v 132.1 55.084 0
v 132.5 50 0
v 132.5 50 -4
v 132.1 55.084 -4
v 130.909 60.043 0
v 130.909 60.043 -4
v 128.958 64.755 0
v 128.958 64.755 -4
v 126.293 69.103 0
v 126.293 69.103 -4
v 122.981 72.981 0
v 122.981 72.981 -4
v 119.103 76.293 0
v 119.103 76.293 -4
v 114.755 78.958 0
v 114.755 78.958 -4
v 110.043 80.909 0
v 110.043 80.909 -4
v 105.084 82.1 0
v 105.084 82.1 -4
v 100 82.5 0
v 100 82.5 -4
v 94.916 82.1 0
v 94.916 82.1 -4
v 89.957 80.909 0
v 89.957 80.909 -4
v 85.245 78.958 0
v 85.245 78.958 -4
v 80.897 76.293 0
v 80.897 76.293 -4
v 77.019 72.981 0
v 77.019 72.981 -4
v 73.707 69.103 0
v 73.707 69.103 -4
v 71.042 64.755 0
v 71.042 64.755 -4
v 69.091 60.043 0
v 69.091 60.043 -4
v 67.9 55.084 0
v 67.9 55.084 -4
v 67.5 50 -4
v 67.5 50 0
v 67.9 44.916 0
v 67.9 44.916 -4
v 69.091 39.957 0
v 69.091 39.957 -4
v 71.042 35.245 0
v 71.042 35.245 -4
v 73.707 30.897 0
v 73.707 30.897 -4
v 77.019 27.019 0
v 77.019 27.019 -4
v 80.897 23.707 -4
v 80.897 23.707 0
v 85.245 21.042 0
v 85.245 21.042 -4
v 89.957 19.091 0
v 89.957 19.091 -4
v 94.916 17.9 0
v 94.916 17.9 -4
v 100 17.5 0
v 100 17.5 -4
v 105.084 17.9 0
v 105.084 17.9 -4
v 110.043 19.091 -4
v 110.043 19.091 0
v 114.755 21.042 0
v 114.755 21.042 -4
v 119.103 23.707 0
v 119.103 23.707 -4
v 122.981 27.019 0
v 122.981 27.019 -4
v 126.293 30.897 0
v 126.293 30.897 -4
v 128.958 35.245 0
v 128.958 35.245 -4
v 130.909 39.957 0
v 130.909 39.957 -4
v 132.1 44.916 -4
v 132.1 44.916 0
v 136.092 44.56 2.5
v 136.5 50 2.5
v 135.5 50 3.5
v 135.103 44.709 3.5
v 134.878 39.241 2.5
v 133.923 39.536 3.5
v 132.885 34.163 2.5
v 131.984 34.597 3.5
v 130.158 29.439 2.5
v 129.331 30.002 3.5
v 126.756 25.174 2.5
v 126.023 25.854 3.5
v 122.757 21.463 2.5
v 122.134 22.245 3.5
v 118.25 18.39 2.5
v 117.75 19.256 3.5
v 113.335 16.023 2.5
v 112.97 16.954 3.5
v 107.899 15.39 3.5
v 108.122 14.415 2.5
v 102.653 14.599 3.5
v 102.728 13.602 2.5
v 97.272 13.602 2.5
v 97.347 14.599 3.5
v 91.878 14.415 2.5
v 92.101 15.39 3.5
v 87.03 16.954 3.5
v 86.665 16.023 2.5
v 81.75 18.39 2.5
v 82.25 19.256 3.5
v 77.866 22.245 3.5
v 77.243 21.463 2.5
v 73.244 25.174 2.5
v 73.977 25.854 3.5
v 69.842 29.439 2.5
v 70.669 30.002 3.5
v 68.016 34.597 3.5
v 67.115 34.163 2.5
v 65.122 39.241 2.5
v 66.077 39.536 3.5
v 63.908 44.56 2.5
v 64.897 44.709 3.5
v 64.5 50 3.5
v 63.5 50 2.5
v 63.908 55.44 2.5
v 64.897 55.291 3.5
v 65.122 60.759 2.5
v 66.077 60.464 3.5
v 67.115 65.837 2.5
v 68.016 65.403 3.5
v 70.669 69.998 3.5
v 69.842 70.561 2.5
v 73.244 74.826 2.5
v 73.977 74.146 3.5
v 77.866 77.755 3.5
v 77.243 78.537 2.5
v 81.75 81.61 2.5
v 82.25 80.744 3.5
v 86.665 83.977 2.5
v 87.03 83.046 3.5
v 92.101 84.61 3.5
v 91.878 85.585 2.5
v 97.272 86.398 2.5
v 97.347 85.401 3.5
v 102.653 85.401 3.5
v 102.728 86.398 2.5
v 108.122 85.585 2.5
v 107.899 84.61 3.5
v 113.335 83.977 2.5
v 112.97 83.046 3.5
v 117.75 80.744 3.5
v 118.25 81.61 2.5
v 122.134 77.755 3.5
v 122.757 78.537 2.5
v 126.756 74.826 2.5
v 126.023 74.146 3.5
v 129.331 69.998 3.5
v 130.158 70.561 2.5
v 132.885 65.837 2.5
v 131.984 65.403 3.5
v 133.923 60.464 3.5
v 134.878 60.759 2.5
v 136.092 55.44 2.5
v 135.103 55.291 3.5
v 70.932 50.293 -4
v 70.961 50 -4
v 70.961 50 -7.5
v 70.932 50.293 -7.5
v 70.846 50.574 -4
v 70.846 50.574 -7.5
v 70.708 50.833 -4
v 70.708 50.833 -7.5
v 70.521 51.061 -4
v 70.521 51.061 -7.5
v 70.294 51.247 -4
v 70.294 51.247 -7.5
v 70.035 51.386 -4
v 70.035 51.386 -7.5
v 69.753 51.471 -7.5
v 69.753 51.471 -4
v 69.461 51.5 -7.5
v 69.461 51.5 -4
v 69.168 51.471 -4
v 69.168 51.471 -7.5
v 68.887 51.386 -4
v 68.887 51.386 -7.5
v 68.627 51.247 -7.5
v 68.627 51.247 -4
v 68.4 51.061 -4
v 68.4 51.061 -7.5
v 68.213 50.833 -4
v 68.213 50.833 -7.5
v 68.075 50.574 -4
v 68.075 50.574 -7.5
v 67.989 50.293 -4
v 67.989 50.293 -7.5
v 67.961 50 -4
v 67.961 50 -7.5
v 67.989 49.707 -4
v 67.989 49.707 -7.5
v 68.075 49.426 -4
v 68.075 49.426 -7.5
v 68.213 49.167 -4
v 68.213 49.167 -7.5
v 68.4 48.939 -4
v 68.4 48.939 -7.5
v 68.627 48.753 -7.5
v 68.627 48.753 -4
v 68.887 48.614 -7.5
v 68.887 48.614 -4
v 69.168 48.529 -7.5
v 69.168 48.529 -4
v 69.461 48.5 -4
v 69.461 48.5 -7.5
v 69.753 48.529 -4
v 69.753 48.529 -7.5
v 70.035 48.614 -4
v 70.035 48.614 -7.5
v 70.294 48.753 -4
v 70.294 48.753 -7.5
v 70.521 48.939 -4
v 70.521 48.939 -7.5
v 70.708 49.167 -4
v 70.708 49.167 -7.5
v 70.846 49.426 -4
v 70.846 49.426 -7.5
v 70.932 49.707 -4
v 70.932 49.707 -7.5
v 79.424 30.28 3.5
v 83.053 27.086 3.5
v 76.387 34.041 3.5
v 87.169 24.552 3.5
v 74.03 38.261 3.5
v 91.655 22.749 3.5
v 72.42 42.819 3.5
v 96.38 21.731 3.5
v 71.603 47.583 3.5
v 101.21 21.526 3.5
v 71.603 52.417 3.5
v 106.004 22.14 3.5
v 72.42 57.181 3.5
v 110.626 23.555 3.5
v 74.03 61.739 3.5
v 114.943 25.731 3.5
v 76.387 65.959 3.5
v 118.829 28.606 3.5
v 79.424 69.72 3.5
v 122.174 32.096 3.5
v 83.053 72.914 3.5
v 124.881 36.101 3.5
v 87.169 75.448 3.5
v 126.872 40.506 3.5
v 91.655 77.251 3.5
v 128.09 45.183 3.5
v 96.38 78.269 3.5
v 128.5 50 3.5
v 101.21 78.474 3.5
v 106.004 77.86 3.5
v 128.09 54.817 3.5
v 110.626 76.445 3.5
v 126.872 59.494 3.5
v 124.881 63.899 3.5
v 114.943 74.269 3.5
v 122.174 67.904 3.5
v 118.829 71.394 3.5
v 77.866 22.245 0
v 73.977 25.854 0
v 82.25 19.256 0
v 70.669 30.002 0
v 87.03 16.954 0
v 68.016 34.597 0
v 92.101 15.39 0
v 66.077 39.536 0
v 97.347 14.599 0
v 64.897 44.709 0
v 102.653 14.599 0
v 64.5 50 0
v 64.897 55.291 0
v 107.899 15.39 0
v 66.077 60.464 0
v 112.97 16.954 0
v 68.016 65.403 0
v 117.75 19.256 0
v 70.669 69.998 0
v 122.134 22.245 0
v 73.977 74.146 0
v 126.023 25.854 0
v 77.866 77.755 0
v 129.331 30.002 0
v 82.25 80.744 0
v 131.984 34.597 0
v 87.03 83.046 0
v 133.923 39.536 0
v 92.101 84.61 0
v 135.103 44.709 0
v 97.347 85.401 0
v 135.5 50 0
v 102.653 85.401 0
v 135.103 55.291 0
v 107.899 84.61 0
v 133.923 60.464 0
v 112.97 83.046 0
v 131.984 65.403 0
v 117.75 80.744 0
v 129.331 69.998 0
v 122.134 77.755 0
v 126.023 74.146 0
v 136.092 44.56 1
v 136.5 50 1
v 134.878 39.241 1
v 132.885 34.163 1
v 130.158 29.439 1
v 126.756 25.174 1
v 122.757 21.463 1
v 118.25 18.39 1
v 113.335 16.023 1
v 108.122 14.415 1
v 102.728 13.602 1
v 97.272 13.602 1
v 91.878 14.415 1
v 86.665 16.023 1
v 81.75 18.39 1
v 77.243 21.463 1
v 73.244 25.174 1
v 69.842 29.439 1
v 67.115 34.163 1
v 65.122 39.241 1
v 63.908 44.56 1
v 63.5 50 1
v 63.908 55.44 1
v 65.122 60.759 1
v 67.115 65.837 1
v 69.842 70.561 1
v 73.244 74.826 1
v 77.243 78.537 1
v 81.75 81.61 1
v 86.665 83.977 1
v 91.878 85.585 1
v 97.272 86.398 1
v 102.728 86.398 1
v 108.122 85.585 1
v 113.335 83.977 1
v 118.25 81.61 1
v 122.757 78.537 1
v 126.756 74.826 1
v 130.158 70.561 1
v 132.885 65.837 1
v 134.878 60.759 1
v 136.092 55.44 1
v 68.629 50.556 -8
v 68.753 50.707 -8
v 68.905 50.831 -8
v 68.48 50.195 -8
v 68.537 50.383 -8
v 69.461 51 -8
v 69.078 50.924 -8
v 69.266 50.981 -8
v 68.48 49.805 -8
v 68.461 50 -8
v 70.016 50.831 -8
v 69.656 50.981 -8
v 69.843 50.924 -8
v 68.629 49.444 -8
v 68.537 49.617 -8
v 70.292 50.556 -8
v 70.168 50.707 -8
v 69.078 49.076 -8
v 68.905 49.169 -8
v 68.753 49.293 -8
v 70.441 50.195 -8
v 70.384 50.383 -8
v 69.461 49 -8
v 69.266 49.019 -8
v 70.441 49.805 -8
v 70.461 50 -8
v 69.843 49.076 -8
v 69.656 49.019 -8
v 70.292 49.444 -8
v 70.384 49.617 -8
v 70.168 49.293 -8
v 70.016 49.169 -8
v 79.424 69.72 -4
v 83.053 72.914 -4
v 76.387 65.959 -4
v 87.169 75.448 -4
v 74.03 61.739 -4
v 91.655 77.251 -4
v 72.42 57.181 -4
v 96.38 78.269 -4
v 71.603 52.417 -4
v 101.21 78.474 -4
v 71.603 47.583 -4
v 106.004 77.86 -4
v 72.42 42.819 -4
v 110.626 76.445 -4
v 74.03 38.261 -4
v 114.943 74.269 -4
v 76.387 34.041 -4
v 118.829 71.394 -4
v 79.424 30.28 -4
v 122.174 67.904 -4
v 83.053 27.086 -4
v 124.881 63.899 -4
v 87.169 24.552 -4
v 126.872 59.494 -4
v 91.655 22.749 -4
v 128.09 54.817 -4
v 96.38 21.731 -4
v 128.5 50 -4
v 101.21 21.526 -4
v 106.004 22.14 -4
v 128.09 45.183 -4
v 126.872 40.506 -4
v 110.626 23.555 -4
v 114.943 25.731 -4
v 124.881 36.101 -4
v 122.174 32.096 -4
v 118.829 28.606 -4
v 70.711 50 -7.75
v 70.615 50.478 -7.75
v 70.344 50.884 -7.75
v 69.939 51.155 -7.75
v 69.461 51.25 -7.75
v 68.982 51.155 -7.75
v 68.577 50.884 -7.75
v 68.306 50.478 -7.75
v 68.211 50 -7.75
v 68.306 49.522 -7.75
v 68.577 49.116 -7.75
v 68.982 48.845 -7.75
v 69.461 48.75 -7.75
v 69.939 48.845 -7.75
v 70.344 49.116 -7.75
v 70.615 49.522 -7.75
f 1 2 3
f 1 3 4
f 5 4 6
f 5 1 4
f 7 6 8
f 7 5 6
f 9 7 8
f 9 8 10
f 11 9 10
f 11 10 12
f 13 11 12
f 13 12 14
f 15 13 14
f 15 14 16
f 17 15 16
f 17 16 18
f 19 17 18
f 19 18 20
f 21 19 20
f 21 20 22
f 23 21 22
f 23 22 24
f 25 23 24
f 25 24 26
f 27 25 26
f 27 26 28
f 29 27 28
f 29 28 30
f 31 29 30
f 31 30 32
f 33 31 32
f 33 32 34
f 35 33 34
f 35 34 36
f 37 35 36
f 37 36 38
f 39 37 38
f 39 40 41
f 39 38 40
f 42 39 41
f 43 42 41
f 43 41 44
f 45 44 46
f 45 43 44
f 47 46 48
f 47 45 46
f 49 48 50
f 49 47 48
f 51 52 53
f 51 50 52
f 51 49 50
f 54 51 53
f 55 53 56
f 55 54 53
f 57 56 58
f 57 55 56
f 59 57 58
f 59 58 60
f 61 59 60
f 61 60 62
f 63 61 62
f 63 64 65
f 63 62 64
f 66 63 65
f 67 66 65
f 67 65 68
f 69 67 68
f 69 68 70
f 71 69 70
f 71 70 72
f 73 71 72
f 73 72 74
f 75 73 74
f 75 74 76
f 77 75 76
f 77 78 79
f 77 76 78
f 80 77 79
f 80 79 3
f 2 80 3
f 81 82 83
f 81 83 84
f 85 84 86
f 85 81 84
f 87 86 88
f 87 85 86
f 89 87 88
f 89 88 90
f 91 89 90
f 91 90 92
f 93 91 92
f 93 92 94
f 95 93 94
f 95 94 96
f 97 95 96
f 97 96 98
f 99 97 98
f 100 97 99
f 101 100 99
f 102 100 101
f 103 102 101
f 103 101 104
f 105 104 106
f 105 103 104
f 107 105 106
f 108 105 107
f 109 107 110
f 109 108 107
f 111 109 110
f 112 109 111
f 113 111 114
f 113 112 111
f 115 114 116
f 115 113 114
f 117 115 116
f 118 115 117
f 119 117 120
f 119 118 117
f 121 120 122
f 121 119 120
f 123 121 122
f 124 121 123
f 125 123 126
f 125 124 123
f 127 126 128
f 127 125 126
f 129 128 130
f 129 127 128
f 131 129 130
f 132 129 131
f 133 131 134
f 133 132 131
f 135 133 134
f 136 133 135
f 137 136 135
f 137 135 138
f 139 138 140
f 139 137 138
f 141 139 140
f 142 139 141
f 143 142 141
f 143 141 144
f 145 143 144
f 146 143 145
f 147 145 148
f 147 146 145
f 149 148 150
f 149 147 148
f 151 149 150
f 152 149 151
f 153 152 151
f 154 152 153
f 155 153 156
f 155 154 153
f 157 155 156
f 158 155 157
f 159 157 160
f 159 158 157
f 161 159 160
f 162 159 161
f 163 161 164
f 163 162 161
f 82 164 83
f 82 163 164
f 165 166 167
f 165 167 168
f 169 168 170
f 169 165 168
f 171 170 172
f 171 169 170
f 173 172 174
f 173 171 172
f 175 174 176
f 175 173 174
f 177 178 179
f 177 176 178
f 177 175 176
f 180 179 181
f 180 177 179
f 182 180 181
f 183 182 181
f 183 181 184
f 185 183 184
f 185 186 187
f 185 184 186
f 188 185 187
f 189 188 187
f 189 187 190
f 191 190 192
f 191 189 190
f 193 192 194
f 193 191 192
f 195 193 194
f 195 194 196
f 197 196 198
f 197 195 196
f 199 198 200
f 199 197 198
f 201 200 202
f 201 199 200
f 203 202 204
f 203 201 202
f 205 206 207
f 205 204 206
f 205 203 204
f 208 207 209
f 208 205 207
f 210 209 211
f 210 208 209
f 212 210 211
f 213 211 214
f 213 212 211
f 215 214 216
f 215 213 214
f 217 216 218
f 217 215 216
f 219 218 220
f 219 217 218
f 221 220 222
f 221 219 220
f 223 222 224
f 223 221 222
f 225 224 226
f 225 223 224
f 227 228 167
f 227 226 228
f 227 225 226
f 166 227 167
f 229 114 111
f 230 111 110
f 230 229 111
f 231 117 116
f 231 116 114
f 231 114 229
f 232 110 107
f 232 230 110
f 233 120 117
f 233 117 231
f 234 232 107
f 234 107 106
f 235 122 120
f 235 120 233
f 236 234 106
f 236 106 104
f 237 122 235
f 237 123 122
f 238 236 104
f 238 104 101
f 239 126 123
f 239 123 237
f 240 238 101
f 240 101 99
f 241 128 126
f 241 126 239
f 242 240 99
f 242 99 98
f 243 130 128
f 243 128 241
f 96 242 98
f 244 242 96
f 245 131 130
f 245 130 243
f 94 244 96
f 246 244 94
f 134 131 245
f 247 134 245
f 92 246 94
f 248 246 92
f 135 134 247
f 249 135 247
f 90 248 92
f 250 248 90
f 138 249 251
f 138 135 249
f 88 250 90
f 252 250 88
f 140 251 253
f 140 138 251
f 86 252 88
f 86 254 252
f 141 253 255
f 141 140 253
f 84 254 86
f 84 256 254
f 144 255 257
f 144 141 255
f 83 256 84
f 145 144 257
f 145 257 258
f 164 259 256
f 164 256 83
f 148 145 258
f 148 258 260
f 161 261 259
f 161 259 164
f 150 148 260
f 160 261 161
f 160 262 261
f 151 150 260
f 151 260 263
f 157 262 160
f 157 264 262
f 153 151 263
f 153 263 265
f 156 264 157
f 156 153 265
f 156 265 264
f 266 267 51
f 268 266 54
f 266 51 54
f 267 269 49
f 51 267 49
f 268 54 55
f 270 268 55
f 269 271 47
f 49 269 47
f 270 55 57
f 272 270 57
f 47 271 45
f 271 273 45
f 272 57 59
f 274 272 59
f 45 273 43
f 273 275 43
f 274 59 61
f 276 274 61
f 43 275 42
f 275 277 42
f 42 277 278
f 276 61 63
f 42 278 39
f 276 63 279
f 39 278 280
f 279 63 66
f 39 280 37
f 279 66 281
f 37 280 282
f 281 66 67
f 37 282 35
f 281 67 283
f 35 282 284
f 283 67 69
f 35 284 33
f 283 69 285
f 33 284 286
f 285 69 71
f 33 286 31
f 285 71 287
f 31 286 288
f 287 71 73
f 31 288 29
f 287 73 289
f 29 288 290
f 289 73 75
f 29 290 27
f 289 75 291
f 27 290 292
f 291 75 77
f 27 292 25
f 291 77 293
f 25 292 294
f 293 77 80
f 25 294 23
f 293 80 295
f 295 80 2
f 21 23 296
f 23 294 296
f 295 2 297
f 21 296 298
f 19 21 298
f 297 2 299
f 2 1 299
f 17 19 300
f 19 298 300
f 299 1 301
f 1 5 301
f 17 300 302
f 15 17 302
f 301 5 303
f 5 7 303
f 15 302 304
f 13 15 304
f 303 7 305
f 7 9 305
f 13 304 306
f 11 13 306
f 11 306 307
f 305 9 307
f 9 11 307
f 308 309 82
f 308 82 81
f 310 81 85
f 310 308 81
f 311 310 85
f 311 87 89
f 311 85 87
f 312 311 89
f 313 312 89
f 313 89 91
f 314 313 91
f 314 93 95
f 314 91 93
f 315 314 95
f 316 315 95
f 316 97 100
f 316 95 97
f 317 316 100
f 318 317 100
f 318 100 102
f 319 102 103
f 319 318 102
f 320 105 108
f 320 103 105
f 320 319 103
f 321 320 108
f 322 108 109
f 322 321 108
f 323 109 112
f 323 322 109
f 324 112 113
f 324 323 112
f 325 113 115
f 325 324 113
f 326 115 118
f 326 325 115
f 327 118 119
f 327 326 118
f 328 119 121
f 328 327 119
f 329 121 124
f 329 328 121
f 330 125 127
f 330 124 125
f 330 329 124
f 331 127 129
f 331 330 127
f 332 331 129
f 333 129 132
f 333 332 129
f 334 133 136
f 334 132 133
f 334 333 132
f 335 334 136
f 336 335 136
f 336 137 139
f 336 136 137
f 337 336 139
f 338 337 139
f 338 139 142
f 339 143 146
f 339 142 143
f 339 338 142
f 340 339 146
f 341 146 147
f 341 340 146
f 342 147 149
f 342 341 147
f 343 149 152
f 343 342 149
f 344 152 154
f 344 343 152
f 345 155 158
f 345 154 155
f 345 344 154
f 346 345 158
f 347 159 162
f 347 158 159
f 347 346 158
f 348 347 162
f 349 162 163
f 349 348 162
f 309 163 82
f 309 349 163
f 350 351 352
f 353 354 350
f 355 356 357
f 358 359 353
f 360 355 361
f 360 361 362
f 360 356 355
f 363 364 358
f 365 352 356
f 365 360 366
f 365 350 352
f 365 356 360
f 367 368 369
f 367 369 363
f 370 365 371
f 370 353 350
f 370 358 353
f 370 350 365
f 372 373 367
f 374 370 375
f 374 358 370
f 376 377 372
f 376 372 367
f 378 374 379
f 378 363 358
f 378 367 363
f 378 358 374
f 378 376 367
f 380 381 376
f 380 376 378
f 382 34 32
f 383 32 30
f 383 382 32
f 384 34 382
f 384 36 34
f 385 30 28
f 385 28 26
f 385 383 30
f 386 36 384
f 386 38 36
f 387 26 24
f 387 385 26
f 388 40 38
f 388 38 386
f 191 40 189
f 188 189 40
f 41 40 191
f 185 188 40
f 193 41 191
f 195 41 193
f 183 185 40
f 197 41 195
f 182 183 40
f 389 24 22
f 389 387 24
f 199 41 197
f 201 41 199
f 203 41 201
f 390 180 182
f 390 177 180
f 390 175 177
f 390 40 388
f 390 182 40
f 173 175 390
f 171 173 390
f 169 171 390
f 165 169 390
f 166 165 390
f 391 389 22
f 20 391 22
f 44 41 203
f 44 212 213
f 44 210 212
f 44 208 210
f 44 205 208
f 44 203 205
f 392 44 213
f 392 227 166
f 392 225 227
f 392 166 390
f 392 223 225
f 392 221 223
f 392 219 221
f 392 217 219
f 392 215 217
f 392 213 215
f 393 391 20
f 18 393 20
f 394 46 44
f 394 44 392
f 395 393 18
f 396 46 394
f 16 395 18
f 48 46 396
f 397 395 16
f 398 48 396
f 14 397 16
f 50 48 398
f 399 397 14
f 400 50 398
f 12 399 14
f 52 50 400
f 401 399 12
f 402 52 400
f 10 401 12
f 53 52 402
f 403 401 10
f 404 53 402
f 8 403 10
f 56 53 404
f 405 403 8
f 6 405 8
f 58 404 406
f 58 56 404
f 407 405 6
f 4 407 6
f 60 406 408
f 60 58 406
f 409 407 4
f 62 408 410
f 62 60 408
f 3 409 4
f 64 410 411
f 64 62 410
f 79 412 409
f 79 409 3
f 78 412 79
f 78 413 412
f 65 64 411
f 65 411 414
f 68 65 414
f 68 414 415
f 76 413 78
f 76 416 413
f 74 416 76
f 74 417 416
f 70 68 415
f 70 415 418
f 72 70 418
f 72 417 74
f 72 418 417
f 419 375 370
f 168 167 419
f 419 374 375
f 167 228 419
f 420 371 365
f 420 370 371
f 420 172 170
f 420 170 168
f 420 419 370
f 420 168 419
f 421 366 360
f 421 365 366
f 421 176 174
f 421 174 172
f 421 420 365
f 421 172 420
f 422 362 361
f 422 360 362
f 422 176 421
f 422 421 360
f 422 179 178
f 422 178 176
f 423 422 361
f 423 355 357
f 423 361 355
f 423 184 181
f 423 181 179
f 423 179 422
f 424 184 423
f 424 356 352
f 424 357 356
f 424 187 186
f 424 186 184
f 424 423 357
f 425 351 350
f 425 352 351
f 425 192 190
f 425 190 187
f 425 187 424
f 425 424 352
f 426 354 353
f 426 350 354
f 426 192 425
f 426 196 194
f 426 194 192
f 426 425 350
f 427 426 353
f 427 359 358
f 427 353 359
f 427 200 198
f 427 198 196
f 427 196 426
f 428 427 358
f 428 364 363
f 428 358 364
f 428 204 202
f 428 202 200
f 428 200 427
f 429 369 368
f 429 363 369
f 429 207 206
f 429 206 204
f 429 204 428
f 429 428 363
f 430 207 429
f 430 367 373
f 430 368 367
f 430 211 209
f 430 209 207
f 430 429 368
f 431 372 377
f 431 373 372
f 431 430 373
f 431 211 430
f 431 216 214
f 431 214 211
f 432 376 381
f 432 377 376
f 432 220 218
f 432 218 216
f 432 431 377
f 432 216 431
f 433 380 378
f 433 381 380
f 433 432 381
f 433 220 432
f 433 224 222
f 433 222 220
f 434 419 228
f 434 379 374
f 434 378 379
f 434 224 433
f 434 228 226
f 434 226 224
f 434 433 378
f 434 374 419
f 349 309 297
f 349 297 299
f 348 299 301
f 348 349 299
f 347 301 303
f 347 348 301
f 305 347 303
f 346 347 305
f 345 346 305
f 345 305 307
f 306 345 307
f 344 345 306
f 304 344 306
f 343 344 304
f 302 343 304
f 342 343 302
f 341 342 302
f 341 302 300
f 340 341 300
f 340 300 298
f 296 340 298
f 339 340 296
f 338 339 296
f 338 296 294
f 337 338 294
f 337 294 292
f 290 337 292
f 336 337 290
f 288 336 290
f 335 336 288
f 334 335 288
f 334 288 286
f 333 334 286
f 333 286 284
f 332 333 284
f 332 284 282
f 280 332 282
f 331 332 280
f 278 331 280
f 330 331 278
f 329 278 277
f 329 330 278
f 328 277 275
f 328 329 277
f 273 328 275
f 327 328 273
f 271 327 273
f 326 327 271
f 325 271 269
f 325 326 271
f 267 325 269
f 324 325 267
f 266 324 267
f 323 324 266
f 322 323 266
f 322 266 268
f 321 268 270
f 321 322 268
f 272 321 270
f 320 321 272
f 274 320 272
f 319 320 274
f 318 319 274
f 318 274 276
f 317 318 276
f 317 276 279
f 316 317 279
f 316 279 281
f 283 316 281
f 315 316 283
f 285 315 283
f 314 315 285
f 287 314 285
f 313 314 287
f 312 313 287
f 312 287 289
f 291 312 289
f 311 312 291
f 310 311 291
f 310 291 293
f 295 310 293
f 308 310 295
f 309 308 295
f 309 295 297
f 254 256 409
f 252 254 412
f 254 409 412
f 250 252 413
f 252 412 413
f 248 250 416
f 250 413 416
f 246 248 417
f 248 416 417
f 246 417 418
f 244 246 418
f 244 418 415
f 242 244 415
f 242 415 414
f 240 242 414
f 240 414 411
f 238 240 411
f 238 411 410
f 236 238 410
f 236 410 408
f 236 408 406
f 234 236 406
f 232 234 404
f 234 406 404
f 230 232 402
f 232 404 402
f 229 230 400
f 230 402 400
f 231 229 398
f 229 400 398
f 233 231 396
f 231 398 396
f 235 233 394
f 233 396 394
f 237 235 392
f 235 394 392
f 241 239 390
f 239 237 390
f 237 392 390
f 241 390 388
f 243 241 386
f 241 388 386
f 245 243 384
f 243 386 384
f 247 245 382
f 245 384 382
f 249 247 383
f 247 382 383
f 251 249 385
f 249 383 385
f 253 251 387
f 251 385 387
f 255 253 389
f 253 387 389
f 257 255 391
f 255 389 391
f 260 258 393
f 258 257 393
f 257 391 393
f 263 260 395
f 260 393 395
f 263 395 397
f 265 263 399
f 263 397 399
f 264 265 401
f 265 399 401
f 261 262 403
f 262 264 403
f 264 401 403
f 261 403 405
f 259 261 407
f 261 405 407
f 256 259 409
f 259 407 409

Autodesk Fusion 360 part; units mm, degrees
sketch "Esboço1" plane through (0, 0, 0) normal (0, 0, 1) x (1, 0, 0)
  circle A0 centre (100, 50) radius 36.5
  circle A1 centre (100, 50) radius 28.5
  dimension "d1" = 73
  dimension "d2" = 57
extrude "Extrusão1" add sketch "Esboço1" along normal blind 3.5
sketch "Esboço2" plane through (0, 0, 0) normal (0, 0, -1) x (1, 0, 0)
  circle A0 centre (100, -50) radius 28.5
  circle A1 centre (100, -50) radius 36.5
  circle A2 centre (100, -50) radius 32.5
  dimension "d5" = 65
extrude "Extrusão2" add sketch "Esboço2" along normal blind 4 contours A2
sketch "Esboço3" plane through (0, 0, -4) normal (0, 0, -1) x (1, 0, 0)
  circle A0 centre (100, -50) radius 28.5
  circle A1 centre (100, -50) radius 32.5
  line L0 (55, -50) -> (160, -50) construction
  circle A2 centre (69.4606, -50) radius 1.5
  dimension "d8" = 3
extrude "Extrusão3" add sketch "Esboço3" along normal blind 4 contours A2
chamfer "Chanfro1" distance 1 angle 45 2 edges at (65.9701, 36.801, 0) (65.9701, 36.801, 3.5)
chamfer "Chanfro2" distance 0.5 angle 45 1 edges at (68.0621, 50.5424, -8)
